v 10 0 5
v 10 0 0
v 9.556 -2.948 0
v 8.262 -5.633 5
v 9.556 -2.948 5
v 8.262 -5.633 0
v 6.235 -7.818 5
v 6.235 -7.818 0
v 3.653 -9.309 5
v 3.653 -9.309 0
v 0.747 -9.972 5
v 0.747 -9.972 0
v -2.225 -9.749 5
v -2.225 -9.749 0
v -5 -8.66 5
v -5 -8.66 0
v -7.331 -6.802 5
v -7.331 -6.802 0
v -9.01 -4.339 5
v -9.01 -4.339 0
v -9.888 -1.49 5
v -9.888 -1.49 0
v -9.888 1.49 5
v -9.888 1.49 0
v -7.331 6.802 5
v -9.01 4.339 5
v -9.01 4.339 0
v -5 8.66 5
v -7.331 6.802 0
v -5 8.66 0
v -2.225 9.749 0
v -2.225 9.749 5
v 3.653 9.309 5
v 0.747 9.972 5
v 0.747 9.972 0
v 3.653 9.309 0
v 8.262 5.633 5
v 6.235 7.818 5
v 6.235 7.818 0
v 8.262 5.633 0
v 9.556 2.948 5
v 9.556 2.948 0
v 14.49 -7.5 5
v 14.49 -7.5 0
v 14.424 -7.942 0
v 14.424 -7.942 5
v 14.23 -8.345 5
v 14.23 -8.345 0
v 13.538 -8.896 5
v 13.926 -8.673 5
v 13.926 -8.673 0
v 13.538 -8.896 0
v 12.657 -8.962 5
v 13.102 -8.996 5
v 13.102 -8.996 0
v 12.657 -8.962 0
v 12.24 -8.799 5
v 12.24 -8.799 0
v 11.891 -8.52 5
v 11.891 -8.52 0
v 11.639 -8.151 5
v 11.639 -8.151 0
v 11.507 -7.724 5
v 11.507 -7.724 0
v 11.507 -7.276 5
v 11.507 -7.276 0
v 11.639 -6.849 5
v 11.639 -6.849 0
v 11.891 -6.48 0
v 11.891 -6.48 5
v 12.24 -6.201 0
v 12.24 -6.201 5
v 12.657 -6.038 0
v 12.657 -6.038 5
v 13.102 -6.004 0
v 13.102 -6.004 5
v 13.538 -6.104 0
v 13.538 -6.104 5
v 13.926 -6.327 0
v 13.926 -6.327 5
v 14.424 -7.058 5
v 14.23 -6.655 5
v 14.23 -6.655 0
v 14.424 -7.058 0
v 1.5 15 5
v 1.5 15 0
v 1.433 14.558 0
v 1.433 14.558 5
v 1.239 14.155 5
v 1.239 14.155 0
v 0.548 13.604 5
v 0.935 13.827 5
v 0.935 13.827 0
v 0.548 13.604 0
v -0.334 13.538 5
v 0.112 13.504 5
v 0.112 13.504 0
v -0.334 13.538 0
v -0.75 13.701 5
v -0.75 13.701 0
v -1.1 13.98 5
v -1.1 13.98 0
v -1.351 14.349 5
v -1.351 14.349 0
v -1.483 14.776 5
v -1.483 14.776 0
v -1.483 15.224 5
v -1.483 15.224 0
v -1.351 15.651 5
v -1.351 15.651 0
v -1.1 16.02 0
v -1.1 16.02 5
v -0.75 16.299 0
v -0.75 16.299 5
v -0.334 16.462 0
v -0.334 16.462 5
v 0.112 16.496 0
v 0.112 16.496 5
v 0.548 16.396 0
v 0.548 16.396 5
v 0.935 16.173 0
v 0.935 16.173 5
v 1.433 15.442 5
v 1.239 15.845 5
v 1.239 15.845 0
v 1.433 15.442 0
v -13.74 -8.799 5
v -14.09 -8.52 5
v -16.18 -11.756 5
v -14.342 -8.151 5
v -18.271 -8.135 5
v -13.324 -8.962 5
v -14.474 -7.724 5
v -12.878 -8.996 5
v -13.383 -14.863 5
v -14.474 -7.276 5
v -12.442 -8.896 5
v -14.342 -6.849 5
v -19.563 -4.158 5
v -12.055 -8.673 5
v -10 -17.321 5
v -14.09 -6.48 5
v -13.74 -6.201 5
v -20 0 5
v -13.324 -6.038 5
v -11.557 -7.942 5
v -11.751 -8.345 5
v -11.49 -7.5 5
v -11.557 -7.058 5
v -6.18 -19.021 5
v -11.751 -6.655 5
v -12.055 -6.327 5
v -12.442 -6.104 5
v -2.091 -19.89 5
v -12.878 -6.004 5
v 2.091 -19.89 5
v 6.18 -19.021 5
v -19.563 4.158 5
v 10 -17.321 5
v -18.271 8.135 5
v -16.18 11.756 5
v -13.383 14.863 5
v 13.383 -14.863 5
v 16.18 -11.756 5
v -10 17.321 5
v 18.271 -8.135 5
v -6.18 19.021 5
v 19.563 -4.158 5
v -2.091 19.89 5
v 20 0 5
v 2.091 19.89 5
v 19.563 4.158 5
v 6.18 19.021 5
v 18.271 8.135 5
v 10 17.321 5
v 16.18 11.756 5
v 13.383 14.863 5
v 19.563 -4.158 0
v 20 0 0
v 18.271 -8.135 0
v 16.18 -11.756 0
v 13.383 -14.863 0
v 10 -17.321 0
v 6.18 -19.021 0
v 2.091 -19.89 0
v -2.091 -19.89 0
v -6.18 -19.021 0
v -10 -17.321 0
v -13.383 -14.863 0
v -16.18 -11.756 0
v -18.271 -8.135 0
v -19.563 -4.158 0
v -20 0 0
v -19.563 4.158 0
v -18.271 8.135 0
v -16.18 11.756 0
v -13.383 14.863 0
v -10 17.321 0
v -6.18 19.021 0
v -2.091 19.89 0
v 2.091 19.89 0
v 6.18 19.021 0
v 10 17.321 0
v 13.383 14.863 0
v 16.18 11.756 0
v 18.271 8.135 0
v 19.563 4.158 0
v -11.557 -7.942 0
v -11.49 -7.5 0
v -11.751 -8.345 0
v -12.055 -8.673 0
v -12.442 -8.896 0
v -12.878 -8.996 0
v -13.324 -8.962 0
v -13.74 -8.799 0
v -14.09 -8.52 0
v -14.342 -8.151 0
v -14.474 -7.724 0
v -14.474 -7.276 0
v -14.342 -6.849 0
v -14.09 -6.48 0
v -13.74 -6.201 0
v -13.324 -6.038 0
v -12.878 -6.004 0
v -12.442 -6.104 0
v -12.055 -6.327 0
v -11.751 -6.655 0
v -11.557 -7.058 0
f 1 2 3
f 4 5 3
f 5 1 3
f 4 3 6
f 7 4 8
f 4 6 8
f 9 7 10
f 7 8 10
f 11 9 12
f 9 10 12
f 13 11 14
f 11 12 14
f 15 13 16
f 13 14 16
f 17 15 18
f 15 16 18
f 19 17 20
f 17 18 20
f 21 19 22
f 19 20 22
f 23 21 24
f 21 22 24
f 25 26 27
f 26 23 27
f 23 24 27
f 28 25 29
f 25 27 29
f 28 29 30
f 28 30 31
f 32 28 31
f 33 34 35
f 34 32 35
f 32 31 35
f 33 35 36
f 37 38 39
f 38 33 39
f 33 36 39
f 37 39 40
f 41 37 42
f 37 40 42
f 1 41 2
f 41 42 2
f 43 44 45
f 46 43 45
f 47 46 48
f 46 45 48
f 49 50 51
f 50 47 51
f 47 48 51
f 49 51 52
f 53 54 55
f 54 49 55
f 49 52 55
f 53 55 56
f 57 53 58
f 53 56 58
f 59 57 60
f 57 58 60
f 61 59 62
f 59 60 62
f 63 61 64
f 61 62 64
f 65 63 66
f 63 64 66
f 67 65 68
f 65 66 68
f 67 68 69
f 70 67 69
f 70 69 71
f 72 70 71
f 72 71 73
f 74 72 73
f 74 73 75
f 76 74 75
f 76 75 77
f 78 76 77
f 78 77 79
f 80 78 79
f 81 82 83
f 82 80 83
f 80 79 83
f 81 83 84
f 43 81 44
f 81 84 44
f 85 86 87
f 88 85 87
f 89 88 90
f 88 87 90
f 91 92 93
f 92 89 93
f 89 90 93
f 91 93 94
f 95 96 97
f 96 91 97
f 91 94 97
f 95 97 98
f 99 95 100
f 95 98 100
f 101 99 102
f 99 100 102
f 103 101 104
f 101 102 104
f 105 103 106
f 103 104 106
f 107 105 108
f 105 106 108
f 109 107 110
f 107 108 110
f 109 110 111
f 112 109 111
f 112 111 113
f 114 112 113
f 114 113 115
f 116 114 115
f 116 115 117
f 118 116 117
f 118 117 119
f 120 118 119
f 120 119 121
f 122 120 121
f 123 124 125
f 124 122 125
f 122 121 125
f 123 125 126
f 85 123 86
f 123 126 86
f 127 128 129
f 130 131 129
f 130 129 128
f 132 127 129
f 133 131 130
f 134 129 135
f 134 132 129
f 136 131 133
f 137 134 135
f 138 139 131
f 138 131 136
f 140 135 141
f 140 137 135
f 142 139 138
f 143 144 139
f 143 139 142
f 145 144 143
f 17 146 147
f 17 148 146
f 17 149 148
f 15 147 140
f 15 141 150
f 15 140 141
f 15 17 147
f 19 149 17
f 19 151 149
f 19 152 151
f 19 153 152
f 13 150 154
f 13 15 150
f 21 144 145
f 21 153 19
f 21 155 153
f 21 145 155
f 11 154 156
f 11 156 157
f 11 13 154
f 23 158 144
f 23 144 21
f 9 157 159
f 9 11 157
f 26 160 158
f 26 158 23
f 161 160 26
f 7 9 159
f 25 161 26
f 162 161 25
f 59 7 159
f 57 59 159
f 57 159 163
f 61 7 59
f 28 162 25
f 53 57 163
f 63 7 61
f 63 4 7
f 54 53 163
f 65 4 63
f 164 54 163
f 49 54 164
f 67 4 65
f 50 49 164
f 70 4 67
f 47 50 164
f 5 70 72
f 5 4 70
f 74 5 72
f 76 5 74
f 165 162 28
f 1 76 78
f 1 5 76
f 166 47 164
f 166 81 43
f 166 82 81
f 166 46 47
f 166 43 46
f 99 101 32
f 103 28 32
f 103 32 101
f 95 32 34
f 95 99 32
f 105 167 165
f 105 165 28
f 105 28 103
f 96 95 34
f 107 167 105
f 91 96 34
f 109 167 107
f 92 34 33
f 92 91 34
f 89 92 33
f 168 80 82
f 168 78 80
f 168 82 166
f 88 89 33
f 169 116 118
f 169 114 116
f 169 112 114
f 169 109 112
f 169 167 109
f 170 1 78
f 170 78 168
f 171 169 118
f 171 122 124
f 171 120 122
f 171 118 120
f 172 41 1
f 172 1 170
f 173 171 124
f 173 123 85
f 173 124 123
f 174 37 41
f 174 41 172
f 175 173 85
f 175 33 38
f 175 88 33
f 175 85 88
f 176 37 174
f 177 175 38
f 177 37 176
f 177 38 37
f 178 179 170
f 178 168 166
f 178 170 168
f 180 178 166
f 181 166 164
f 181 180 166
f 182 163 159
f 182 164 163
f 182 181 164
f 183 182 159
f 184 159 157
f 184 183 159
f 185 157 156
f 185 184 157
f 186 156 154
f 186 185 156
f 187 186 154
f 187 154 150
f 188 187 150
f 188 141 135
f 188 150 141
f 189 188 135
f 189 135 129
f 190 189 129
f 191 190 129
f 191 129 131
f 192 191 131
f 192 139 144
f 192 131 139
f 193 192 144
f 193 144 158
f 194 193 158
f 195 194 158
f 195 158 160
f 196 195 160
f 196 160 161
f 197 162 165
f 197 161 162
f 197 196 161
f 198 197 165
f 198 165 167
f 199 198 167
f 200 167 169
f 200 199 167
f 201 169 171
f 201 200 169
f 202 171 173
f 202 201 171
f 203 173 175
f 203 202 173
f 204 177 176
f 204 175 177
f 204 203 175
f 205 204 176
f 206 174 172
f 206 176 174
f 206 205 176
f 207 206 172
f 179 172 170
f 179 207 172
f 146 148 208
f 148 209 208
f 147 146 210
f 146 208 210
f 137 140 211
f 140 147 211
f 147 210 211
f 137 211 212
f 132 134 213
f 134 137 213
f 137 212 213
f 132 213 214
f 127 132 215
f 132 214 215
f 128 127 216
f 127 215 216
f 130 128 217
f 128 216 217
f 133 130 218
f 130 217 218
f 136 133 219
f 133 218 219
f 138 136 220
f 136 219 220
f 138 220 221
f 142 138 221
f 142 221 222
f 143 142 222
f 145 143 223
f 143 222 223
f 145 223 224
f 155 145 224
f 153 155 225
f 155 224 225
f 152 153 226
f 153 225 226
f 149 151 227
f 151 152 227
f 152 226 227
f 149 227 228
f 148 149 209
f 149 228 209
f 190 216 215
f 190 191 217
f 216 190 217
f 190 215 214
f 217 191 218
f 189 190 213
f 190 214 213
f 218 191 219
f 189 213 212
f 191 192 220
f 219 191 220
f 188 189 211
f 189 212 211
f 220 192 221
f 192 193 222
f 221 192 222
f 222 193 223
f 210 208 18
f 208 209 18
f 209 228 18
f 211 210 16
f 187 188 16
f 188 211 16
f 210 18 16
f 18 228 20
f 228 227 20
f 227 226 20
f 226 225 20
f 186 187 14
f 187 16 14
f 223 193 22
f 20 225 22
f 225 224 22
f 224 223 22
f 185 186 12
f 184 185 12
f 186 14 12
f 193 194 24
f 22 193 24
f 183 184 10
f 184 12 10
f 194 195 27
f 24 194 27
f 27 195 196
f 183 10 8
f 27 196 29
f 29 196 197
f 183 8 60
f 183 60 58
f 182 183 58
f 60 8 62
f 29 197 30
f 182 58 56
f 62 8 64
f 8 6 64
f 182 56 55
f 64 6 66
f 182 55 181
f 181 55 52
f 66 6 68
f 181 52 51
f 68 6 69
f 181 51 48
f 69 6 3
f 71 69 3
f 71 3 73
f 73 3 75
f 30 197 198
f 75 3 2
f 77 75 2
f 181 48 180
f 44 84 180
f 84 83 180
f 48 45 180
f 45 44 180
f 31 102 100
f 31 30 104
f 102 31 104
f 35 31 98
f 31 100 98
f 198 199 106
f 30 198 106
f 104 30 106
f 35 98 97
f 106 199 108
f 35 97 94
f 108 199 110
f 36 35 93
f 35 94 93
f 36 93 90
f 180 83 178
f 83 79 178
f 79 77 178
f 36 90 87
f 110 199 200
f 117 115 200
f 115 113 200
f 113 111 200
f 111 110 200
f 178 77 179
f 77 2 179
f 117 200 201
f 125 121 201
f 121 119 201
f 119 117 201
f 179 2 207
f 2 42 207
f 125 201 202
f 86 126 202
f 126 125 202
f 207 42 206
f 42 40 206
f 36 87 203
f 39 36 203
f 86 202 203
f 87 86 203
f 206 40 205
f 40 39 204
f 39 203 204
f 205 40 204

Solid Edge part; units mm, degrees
sketch "Sketch1" plane through (0, 0, 0) normal (0, 0, 1) x (1, 0, 0)
  circle A0 centre (0, 0) radius 10
  circle A1 centre (-12.9904, -7.5) radius 1.5
  circle A2 centre (12.9904, -7.5) radius 1.5
  circle A3 centre (0, 0) radius 20
  circle A4 centre (0, 15) radius 1.5
  dimension "D1" = 20
  dimension "D2" = 3
  dimension "D3" = 30
extrude "Protrusion1" add sketch "Sketch1" along normal blind 5
